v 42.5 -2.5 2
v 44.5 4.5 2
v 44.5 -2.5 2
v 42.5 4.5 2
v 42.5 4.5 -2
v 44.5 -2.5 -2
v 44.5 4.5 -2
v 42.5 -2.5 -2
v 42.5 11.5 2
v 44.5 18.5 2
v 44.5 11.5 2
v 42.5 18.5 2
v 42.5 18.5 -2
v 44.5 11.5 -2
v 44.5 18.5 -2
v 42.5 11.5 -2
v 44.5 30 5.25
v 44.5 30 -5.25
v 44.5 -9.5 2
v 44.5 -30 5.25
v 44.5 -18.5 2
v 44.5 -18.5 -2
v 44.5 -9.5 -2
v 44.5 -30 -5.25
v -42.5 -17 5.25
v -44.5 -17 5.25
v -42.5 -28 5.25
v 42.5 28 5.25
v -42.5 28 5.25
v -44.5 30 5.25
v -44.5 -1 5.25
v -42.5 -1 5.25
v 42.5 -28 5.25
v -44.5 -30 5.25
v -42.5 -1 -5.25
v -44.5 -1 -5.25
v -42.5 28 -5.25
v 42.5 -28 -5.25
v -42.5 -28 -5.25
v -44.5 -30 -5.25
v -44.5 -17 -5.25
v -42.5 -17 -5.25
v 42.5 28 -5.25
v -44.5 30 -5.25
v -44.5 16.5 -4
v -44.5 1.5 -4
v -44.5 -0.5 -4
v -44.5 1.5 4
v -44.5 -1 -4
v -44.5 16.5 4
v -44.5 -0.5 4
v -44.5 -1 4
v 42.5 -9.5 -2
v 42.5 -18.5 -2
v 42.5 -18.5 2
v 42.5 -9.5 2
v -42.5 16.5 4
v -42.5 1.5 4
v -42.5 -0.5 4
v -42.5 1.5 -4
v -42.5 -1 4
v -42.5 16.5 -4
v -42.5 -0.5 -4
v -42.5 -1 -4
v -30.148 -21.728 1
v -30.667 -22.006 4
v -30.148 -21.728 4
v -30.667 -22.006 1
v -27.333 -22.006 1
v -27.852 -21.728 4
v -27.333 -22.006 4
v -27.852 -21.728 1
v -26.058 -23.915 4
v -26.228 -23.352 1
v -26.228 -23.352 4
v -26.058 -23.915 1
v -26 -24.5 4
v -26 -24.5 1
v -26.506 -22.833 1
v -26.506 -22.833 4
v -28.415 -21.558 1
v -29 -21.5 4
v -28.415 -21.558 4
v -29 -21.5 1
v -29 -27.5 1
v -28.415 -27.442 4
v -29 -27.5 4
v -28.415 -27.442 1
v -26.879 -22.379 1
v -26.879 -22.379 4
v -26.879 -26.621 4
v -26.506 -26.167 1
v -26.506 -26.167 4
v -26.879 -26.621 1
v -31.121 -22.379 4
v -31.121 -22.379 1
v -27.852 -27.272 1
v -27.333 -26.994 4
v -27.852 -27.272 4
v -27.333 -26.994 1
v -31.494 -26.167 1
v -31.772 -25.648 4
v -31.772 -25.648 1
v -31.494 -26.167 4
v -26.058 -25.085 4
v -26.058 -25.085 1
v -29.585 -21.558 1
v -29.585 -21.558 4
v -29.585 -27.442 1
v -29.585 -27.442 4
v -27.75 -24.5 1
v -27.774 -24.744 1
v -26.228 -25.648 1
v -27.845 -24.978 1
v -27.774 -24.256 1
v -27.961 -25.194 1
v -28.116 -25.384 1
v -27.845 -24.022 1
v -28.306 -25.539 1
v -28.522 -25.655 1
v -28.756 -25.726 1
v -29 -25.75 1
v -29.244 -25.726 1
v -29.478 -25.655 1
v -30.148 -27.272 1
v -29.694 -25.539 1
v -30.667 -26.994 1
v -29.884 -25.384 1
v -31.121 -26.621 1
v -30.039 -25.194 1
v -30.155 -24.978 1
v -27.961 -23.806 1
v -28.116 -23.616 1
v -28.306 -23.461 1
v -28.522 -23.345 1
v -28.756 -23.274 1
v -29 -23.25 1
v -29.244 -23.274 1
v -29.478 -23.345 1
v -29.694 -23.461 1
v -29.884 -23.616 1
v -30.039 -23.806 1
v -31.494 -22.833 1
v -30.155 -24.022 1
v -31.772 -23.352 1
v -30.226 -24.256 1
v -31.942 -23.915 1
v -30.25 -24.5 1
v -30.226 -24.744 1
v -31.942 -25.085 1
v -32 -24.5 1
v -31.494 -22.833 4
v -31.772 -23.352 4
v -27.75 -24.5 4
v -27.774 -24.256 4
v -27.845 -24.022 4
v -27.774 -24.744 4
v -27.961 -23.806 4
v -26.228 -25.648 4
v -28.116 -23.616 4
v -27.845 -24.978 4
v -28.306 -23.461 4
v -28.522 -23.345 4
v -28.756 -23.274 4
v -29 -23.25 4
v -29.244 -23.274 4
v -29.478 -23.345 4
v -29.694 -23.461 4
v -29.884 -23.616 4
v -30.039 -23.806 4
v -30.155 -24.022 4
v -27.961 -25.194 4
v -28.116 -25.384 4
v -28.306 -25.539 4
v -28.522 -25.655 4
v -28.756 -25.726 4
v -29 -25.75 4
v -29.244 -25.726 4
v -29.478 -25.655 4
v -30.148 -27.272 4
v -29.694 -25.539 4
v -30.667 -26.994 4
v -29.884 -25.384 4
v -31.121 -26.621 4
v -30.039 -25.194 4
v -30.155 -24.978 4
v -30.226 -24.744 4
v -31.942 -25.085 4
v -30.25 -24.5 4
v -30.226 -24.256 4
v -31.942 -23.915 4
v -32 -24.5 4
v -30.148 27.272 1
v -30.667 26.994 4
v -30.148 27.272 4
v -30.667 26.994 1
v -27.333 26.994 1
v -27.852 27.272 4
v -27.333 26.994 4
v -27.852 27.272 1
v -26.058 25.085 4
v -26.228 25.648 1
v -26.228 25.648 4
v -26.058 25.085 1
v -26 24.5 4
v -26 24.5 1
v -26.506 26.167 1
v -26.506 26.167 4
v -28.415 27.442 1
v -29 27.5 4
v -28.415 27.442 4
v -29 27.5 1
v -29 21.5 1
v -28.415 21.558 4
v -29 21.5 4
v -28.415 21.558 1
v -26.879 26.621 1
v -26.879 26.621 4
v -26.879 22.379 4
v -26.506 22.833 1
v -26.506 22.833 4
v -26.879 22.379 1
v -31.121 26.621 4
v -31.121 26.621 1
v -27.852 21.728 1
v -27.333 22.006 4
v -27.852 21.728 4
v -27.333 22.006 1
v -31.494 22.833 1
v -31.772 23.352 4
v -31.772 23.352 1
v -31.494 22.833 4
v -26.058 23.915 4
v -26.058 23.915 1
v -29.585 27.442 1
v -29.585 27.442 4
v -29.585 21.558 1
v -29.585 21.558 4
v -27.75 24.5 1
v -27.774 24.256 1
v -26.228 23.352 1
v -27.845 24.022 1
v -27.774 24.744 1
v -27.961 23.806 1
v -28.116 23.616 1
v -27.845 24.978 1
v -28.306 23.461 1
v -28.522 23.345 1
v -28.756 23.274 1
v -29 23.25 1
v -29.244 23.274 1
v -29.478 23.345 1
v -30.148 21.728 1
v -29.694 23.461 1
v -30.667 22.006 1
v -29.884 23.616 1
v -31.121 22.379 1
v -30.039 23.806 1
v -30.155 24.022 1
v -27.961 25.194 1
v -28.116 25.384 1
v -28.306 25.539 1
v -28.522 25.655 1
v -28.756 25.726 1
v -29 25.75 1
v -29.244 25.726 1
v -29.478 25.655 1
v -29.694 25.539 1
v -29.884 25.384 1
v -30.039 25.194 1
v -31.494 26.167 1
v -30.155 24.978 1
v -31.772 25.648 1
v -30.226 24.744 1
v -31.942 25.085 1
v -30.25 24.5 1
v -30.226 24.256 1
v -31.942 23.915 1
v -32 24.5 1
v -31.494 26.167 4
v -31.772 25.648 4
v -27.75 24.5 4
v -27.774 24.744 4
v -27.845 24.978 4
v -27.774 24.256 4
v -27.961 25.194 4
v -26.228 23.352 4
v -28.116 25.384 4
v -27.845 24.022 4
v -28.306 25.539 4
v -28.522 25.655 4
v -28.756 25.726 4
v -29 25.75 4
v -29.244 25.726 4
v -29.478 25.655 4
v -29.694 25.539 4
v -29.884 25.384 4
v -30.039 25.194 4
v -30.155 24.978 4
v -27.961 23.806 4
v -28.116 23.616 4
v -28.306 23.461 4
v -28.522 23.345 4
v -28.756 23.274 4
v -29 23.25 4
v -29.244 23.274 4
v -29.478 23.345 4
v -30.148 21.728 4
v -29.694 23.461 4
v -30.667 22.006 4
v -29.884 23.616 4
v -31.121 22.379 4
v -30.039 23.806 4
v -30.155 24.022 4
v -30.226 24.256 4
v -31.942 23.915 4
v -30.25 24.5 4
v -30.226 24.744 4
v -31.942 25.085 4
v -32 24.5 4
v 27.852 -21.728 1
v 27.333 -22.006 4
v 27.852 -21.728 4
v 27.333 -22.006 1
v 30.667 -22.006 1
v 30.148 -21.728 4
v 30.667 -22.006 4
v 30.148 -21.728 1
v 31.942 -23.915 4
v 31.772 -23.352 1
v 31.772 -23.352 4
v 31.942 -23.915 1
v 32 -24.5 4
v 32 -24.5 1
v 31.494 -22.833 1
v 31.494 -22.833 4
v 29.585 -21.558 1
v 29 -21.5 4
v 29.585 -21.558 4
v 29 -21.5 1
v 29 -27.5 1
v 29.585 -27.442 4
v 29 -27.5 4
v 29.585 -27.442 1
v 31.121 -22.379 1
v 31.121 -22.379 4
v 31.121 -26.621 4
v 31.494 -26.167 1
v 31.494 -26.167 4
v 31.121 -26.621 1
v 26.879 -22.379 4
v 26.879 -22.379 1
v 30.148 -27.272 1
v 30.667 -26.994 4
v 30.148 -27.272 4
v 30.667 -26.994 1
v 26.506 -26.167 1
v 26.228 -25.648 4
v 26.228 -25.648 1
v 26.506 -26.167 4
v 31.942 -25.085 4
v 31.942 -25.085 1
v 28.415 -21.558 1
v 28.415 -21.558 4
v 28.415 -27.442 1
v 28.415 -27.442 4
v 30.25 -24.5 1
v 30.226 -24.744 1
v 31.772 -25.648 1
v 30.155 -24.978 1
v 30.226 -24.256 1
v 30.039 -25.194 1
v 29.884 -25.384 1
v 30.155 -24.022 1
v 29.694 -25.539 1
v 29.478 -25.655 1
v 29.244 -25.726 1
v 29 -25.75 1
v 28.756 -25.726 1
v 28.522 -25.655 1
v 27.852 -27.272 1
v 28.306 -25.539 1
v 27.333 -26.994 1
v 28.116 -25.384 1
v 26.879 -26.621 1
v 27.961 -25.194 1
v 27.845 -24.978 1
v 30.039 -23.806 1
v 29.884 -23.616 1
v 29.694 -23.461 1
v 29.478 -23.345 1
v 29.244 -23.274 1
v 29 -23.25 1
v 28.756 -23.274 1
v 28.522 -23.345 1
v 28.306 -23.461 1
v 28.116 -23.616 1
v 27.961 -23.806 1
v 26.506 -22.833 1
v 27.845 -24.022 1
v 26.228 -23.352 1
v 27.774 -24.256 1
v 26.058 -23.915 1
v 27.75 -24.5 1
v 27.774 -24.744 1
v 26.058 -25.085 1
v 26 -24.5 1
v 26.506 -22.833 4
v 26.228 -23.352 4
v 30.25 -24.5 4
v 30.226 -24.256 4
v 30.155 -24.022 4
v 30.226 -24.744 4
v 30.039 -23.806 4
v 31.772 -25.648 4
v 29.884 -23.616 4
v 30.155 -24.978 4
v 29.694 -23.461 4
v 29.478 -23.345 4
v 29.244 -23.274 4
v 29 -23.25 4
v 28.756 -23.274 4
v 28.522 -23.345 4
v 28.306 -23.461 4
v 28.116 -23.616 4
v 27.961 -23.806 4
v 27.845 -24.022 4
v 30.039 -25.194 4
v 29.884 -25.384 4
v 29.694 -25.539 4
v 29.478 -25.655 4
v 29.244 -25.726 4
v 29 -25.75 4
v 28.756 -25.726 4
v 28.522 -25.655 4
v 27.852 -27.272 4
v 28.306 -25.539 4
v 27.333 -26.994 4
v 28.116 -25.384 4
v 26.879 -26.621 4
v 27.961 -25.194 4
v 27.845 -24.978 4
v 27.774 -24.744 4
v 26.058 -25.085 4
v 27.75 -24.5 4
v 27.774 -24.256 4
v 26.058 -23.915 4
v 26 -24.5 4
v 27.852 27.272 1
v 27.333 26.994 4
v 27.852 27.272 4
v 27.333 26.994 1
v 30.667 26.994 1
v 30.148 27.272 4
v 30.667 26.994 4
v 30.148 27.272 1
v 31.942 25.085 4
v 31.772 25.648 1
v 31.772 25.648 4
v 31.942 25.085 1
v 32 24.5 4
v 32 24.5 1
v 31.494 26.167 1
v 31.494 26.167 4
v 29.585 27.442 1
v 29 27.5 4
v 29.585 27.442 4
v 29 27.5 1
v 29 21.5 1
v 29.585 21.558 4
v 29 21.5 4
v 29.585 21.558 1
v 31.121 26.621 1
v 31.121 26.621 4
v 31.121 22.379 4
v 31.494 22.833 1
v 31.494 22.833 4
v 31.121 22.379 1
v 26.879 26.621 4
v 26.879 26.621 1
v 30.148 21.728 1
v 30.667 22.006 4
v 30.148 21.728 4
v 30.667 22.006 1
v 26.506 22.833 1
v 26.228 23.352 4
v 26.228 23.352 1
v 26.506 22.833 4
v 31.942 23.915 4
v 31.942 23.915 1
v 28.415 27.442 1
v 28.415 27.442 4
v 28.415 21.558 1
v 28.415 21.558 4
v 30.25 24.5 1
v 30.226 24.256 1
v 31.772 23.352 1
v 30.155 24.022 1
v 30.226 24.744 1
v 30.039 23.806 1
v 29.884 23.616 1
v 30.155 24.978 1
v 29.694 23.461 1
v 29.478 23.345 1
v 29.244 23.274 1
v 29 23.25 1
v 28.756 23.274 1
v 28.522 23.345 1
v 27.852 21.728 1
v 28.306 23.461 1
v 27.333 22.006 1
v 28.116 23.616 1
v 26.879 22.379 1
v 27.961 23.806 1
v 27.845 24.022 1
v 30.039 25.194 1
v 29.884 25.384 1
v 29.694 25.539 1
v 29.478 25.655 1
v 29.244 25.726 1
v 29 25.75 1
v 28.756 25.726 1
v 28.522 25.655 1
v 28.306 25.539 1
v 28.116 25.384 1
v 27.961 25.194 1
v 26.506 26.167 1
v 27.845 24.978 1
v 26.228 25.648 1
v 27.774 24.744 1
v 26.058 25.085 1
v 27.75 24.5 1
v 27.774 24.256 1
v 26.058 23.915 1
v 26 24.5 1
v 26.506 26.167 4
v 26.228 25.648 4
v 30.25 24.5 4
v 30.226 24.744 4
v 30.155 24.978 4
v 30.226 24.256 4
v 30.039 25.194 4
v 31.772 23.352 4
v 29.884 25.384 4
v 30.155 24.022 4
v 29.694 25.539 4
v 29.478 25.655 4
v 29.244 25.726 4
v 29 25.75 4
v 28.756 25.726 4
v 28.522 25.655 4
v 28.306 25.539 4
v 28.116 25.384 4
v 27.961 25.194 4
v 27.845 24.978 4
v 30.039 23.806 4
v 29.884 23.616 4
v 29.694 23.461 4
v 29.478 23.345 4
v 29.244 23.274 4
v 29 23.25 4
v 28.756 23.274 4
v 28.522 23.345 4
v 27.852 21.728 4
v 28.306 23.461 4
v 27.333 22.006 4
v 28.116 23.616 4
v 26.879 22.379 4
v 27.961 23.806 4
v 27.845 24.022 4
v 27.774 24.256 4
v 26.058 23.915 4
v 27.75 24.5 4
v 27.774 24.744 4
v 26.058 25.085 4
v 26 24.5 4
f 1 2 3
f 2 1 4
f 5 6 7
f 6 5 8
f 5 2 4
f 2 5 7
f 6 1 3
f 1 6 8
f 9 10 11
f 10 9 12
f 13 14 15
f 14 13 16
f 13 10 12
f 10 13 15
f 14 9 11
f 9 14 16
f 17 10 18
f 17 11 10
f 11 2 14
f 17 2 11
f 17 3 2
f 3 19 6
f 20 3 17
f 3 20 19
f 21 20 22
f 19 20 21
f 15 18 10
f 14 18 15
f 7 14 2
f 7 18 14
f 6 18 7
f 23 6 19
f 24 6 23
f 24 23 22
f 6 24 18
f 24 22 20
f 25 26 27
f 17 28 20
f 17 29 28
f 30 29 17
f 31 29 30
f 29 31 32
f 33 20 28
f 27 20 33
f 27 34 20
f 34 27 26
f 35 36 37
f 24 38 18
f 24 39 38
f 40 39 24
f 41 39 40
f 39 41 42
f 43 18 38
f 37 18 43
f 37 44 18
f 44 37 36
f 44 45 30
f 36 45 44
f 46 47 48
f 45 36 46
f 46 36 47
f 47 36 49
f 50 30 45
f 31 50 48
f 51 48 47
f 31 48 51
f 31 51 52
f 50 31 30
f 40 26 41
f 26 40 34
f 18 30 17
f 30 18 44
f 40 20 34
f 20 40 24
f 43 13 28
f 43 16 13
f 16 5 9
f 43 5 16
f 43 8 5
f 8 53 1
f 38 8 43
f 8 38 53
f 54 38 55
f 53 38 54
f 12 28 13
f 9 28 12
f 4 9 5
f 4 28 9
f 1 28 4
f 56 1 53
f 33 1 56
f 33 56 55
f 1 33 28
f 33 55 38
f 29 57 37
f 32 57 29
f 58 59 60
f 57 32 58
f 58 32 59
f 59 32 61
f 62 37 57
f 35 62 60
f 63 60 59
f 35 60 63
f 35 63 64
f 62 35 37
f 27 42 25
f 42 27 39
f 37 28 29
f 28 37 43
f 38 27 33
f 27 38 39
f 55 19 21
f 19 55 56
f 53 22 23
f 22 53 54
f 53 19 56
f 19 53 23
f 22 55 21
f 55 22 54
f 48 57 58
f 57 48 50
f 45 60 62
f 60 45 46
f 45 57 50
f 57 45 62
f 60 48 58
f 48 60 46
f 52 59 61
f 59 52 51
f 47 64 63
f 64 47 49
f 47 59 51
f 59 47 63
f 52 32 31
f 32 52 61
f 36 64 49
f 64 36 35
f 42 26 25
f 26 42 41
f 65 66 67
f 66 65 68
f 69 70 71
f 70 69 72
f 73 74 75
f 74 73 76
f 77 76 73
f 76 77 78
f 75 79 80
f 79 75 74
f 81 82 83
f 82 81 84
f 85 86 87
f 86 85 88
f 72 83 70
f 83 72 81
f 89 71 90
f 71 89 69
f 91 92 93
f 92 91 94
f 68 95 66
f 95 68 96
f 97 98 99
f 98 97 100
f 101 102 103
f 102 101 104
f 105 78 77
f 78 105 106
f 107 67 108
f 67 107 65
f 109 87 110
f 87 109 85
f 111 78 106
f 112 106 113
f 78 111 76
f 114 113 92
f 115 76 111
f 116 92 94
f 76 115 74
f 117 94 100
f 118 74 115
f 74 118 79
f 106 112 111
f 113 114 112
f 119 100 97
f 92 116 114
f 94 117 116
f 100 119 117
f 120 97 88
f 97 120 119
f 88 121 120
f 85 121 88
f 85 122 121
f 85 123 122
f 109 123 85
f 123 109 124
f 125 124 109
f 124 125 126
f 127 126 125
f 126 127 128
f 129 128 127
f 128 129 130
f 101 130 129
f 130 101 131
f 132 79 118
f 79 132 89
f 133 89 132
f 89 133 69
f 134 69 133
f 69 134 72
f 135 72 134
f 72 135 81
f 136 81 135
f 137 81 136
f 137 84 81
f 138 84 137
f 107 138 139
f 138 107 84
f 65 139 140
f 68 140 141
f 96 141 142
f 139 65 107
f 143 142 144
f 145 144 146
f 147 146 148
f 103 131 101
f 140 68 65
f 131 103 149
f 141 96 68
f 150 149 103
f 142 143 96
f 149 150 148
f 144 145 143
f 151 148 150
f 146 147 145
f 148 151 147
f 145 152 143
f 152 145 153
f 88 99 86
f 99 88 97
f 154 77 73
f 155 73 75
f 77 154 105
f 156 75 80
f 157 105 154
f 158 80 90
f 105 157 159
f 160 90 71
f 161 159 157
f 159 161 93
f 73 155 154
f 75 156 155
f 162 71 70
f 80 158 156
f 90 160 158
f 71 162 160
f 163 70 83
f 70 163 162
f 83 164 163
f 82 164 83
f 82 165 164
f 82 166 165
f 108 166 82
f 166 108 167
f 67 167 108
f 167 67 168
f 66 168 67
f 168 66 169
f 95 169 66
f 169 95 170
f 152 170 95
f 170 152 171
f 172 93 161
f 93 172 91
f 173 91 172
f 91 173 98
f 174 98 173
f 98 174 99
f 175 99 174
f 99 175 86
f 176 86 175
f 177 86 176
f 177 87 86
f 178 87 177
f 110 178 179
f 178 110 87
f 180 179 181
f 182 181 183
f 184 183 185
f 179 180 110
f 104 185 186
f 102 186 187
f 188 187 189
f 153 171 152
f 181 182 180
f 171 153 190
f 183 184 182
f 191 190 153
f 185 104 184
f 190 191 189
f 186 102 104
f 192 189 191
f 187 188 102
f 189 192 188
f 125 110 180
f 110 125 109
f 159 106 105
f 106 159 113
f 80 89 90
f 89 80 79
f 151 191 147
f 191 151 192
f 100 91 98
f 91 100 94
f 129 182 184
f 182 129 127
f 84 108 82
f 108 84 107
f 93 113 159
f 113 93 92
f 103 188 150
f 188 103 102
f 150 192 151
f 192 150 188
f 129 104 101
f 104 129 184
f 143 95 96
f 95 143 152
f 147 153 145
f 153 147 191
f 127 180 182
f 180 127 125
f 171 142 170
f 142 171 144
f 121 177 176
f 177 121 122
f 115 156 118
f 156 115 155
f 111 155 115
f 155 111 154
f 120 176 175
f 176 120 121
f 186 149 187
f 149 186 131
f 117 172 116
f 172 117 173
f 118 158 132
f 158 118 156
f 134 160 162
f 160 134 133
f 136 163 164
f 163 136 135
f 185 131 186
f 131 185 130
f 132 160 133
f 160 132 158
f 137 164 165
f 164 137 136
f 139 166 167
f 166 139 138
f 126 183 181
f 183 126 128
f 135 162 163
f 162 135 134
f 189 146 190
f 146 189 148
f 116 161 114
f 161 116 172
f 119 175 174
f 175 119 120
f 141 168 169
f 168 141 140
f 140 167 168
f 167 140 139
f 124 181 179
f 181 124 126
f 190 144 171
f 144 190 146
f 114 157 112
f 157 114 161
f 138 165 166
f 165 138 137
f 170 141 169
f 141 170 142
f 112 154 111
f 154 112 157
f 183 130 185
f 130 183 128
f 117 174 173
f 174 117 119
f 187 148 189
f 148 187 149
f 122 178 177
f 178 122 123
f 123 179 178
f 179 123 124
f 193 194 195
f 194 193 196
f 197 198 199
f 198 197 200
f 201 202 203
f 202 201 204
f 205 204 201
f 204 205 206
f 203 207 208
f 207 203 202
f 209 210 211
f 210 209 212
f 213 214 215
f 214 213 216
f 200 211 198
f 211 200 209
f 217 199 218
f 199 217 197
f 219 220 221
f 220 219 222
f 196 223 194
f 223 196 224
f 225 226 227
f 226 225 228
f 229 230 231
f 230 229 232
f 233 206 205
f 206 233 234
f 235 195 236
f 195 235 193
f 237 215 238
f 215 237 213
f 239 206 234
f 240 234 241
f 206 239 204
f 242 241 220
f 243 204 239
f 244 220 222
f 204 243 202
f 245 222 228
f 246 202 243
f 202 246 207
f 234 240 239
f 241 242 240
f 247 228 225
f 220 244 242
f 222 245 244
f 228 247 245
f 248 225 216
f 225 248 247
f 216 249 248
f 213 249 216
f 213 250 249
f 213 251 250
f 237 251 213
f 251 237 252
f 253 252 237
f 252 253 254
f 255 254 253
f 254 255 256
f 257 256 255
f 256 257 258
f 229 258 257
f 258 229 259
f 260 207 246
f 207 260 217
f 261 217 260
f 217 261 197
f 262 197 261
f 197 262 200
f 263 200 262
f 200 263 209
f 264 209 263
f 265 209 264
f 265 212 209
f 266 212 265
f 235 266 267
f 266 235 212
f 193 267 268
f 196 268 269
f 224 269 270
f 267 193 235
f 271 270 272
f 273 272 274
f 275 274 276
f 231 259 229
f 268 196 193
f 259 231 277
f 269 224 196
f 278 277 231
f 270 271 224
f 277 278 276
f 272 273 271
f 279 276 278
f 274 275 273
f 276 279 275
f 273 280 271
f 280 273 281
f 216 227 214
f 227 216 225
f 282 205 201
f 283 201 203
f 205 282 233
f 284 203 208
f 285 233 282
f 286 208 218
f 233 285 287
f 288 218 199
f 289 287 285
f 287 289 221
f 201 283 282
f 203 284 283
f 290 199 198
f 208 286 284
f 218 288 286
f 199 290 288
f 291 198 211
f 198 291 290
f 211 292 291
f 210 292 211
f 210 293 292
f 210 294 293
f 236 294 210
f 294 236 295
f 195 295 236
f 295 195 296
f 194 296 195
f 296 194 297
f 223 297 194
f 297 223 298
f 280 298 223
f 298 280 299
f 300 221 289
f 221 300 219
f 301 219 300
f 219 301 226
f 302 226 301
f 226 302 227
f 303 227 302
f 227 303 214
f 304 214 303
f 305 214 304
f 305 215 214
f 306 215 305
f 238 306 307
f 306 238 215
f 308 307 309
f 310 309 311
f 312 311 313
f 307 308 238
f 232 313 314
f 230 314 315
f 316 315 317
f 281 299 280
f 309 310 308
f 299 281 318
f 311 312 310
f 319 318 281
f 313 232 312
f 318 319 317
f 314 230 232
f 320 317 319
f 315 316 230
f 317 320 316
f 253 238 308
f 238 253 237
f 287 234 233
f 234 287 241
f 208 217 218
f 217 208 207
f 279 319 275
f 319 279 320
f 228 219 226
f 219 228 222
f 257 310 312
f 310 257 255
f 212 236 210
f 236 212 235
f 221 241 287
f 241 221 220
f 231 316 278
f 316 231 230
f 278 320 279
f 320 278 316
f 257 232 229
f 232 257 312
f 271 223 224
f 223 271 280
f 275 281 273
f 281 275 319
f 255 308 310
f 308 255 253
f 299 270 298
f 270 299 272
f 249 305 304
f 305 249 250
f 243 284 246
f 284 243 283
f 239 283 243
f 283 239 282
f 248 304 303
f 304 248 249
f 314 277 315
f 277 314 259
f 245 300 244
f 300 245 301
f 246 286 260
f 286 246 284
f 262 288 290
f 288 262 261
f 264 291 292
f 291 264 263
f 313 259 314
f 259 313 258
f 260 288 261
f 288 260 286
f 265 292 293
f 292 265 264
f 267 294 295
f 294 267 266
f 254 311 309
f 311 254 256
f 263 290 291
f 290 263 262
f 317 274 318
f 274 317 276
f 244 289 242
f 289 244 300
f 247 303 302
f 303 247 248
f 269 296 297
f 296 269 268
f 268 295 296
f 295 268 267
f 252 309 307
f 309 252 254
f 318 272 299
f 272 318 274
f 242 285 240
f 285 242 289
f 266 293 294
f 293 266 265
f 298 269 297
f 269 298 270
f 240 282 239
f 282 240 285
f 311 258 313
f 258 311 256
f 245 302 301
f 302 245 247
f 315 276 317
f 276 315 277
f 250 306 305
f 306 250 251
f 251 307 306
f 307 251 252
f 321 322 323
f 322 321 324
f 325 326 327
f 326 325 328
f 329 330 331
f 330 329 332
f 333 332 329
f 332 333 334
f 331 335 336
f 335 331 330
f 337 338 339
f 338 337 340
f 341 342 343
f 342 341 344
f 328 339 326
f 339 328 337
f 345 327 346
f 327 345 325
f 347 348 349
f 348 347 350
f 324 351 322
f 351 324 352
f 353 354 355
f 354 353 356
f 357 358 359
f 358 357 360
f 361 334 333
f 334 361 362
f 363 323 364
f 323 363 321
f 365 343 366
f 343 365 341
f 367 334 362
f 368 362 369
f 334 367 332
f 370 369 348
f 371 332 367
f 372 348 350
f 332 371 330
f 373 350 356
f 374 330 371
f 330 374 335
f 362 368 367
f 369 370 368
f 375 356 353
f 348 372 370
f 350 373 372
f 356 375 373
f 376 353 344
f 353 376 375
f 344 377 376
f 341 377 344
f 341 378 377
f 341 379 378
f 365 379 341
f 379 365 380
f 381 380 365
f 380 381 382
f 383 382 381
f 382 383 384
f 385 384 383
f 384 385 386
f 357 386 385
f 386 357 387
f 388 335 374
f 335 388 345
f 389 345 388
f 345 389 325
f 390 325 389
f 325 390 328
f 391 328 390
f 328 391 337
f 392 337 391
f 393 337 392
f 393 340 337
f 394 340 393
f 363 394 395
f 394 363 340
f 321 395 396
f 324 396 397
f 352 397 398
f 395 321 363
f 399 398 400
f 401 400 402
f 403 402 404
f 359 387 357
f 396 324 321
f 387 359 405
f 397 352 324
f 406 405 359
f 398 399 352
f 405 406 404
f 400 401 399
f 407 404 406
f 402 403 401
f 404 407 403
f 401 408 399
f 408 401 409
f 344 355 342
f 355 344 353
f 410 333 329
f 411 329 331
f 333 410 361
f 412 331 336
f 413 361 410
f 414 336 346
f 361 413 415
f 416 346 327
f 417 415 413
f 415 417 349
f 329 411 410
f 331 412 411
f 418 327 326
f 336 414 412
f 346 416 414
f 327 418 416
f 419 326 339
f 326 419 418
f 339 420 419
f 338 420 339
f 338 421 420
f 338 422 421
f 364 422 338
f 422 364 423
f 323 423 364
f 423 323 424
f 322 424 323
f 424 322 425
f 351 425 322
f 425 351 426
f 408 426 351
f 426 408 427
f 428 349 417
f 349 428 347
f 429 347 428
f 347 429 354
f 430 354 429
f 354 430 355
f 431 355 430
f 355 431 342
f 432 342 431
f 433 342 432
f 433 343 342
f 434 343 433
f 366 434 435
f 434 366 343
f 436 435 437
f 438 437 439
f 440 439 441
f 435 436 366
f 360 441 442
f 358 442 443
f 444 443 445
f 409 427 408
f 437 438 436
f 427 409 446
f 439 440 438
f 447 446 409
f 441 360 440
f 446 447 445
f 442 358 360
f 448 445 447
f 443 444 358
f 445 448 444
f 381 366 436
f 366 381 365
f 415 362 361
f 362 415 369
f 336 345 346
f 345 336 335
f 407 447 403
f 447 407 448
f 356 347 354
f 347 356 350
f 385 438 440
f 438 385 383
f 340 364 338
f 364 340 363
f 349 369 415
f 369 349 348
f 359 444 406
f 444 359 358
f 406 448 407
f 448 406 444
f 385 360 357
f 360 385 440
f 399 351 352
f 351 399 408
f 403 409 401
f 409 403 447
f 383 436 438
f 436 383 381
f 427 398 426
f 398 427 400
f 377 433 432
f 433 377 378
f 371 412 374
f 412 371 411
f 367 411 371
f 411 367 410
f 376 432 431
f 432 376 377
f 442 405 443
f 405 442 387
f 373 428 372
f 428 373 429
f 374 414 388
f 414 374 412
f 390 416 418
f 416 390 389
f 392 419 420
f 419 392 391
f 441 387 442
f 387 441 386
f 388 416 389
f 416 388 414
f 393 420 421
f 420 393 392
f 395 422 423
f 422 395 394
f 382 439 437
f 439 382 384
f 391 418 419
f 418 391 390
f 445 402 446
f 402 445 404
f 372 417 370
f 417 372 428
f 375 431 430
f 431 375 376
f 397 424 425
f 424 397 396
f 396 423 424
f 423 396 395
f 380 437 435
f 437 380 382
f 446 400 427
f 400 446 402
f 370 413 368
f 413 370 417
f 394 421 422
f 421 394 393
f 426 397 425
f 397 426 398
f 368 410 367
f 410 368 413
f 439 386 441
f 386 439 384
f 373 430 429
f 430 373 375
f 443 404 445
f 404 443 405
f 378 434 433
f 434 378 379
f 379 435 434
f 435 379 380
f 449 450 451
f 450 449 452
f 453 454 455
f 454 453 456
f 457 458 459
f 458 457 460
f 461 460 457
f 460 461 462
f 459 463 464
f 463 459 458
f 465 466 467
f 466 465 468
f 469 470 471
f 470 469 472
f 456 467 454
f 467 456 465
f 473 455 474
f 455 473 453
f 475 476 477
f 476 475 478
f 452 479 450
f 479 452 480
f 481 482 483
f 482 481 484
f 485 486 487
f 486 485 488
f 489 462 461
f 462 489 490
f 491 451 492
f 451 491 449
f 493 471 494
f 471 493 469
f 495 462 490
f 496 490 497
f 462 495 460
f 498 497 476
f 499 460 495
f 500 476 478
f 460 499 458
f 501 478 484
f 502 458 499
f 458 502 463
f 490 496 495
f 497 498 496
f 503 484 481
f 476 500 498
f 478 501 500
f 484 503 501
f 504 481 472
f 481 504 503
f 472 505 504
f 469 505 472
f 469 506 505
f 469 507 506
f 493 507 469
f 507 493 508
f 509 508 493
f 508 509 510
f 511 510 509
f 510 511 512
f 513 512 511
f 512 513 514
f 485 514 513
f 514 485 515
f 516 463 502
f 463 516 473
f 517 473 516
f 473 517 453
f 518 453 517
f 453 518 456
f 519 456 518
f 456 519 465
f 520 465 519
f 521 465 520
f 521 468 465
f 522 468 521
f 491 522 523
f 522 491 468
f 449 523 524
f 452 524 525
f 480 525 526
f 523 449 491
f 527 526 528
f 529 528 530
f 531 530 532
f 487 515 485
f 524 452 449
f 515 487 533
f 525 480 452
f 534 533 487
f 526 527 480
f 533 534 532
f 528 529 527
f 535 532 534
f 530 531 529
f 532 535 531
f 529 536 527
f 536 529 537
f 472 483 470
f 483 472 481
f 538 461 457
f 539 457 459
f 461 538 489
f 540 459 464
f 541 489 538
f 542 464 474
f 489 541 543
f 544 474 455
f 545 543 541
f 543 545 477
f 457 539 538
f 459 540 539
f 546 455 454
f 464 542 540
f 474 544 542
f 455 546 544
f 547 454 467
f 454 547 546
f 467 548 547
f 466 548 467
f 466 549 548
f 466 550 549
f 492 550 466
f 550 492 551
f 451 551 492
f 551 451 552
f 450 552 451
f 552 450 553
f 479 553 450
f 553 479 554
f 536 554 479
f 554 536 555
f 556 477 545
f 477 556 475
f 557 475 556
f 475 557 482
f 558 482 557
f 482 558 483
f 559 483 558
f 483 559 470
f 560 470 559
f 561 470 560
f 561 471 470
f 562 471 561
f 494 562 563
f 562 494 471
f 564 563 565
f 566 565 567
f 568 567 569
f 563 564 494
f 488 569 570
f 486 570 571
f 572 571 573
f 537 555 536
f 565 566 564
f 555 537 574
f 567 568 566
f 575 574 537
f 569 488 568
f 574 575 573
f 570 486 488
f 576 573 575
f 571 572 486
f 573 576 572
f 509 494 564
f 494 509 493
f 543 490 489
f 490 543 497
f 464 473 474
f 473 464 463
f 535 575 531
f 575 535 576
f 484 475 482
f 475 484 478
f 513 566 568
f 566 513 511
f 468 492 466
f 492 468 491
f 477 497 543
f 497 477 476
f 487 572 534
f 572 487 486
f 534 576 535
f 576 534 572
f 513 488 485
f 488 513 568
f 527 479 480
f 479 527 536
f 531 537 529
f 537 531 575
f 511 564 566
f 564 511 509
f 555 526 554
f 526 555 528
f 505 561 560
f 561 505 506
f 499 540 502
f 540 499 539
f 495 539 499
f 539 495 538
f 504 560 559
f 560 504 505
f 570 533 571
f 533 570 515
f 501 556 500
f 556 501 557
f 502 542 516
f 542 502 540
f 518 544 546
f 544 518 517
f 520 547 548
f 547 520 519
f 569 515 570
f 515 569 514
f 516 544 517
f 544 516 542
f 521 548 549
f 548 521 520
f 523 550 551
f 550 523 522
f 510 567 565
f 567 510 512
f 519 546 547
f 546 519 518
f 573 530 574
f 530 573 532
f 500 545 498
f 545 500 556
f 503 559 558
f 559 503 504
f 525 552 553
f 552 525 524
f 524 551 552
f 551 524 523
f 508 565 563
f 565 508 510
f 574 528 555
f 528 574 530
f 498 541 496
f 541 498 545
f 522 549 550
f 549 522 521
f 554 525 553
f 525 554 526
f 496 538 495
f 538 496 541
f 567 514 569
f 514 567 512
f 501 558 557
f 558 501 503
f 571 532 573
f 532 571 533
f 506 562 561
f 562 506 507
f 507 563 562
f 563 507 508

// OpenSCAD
// Raspberry Pi 4 Case
// Pi 4: 85mm x 56mm x ~17mm
pi_length = 85;
pi_width = 56;
pi_height = 17;
wall = 2;
vent_slots = 5;

// Bottom case
difference() {
    // Outer shell
    cube([pi_length + wall*2, pi_width + wall*2, pi_height/2 + wall], center=true);

    // Pi pocket
    translate([0, 0, wall])
        cube([pi_length, pi_width, pi_height], center=true);

    // USB-C power cutout (rear)
    translate([pi_length/2, -pi_width/4, 0])
        cube([wall*3, 9, 4], center=true);

    // Micro HDMI cutouts (2x)
    for (y = [0, 14]) {
        translate([pi_length/2, y - pi_width/4 + 15, 0])
            cube([wall*3, 7, 4], center=true);
    }

    // USB-A cutouts (2x)
    translate([-pi_length/2, pi_width/4 - 5, 0])
        cube([wall*3, 15, 8], center=true);
    translate([-pi_length/2, pi_width/4 - 22, 0])
        cube([wall*3, 15, 8], center=true);

    // Ethernet cutout
    translate([-pi_length/2, -pi_width/4 + 5, 0])
        cube([wall*3, 16, 14], center=true);

    // Ventilation slots (bottom)
    for (i = [0:vent_slots-1]) {
        translate([i * 12 - 24, 0, -pi_height/4])
            cube([8, pi_width - 10, wall + 1], center=true);
    }

    // Mounting posts holes
    for (x = [-1, 1]) {
        for (y = [-1, 1]) {
            translate([x * 29, y * 24.5, -pi_height/4])
                cylinder(d=2.7, h=10, center=true, $fn=32);
        }
    }
}

// Mounting posts
for (x = [-1, 1]) {
    for (y = [-1, 1]) {
        translate([x * 29, y * 24.5, wall/2])
            difference() {
                cylinder(d=6, h=3, $fn=32);
                cylinder(d=2.5, h=4, $fn=32);
            }
    }
}
